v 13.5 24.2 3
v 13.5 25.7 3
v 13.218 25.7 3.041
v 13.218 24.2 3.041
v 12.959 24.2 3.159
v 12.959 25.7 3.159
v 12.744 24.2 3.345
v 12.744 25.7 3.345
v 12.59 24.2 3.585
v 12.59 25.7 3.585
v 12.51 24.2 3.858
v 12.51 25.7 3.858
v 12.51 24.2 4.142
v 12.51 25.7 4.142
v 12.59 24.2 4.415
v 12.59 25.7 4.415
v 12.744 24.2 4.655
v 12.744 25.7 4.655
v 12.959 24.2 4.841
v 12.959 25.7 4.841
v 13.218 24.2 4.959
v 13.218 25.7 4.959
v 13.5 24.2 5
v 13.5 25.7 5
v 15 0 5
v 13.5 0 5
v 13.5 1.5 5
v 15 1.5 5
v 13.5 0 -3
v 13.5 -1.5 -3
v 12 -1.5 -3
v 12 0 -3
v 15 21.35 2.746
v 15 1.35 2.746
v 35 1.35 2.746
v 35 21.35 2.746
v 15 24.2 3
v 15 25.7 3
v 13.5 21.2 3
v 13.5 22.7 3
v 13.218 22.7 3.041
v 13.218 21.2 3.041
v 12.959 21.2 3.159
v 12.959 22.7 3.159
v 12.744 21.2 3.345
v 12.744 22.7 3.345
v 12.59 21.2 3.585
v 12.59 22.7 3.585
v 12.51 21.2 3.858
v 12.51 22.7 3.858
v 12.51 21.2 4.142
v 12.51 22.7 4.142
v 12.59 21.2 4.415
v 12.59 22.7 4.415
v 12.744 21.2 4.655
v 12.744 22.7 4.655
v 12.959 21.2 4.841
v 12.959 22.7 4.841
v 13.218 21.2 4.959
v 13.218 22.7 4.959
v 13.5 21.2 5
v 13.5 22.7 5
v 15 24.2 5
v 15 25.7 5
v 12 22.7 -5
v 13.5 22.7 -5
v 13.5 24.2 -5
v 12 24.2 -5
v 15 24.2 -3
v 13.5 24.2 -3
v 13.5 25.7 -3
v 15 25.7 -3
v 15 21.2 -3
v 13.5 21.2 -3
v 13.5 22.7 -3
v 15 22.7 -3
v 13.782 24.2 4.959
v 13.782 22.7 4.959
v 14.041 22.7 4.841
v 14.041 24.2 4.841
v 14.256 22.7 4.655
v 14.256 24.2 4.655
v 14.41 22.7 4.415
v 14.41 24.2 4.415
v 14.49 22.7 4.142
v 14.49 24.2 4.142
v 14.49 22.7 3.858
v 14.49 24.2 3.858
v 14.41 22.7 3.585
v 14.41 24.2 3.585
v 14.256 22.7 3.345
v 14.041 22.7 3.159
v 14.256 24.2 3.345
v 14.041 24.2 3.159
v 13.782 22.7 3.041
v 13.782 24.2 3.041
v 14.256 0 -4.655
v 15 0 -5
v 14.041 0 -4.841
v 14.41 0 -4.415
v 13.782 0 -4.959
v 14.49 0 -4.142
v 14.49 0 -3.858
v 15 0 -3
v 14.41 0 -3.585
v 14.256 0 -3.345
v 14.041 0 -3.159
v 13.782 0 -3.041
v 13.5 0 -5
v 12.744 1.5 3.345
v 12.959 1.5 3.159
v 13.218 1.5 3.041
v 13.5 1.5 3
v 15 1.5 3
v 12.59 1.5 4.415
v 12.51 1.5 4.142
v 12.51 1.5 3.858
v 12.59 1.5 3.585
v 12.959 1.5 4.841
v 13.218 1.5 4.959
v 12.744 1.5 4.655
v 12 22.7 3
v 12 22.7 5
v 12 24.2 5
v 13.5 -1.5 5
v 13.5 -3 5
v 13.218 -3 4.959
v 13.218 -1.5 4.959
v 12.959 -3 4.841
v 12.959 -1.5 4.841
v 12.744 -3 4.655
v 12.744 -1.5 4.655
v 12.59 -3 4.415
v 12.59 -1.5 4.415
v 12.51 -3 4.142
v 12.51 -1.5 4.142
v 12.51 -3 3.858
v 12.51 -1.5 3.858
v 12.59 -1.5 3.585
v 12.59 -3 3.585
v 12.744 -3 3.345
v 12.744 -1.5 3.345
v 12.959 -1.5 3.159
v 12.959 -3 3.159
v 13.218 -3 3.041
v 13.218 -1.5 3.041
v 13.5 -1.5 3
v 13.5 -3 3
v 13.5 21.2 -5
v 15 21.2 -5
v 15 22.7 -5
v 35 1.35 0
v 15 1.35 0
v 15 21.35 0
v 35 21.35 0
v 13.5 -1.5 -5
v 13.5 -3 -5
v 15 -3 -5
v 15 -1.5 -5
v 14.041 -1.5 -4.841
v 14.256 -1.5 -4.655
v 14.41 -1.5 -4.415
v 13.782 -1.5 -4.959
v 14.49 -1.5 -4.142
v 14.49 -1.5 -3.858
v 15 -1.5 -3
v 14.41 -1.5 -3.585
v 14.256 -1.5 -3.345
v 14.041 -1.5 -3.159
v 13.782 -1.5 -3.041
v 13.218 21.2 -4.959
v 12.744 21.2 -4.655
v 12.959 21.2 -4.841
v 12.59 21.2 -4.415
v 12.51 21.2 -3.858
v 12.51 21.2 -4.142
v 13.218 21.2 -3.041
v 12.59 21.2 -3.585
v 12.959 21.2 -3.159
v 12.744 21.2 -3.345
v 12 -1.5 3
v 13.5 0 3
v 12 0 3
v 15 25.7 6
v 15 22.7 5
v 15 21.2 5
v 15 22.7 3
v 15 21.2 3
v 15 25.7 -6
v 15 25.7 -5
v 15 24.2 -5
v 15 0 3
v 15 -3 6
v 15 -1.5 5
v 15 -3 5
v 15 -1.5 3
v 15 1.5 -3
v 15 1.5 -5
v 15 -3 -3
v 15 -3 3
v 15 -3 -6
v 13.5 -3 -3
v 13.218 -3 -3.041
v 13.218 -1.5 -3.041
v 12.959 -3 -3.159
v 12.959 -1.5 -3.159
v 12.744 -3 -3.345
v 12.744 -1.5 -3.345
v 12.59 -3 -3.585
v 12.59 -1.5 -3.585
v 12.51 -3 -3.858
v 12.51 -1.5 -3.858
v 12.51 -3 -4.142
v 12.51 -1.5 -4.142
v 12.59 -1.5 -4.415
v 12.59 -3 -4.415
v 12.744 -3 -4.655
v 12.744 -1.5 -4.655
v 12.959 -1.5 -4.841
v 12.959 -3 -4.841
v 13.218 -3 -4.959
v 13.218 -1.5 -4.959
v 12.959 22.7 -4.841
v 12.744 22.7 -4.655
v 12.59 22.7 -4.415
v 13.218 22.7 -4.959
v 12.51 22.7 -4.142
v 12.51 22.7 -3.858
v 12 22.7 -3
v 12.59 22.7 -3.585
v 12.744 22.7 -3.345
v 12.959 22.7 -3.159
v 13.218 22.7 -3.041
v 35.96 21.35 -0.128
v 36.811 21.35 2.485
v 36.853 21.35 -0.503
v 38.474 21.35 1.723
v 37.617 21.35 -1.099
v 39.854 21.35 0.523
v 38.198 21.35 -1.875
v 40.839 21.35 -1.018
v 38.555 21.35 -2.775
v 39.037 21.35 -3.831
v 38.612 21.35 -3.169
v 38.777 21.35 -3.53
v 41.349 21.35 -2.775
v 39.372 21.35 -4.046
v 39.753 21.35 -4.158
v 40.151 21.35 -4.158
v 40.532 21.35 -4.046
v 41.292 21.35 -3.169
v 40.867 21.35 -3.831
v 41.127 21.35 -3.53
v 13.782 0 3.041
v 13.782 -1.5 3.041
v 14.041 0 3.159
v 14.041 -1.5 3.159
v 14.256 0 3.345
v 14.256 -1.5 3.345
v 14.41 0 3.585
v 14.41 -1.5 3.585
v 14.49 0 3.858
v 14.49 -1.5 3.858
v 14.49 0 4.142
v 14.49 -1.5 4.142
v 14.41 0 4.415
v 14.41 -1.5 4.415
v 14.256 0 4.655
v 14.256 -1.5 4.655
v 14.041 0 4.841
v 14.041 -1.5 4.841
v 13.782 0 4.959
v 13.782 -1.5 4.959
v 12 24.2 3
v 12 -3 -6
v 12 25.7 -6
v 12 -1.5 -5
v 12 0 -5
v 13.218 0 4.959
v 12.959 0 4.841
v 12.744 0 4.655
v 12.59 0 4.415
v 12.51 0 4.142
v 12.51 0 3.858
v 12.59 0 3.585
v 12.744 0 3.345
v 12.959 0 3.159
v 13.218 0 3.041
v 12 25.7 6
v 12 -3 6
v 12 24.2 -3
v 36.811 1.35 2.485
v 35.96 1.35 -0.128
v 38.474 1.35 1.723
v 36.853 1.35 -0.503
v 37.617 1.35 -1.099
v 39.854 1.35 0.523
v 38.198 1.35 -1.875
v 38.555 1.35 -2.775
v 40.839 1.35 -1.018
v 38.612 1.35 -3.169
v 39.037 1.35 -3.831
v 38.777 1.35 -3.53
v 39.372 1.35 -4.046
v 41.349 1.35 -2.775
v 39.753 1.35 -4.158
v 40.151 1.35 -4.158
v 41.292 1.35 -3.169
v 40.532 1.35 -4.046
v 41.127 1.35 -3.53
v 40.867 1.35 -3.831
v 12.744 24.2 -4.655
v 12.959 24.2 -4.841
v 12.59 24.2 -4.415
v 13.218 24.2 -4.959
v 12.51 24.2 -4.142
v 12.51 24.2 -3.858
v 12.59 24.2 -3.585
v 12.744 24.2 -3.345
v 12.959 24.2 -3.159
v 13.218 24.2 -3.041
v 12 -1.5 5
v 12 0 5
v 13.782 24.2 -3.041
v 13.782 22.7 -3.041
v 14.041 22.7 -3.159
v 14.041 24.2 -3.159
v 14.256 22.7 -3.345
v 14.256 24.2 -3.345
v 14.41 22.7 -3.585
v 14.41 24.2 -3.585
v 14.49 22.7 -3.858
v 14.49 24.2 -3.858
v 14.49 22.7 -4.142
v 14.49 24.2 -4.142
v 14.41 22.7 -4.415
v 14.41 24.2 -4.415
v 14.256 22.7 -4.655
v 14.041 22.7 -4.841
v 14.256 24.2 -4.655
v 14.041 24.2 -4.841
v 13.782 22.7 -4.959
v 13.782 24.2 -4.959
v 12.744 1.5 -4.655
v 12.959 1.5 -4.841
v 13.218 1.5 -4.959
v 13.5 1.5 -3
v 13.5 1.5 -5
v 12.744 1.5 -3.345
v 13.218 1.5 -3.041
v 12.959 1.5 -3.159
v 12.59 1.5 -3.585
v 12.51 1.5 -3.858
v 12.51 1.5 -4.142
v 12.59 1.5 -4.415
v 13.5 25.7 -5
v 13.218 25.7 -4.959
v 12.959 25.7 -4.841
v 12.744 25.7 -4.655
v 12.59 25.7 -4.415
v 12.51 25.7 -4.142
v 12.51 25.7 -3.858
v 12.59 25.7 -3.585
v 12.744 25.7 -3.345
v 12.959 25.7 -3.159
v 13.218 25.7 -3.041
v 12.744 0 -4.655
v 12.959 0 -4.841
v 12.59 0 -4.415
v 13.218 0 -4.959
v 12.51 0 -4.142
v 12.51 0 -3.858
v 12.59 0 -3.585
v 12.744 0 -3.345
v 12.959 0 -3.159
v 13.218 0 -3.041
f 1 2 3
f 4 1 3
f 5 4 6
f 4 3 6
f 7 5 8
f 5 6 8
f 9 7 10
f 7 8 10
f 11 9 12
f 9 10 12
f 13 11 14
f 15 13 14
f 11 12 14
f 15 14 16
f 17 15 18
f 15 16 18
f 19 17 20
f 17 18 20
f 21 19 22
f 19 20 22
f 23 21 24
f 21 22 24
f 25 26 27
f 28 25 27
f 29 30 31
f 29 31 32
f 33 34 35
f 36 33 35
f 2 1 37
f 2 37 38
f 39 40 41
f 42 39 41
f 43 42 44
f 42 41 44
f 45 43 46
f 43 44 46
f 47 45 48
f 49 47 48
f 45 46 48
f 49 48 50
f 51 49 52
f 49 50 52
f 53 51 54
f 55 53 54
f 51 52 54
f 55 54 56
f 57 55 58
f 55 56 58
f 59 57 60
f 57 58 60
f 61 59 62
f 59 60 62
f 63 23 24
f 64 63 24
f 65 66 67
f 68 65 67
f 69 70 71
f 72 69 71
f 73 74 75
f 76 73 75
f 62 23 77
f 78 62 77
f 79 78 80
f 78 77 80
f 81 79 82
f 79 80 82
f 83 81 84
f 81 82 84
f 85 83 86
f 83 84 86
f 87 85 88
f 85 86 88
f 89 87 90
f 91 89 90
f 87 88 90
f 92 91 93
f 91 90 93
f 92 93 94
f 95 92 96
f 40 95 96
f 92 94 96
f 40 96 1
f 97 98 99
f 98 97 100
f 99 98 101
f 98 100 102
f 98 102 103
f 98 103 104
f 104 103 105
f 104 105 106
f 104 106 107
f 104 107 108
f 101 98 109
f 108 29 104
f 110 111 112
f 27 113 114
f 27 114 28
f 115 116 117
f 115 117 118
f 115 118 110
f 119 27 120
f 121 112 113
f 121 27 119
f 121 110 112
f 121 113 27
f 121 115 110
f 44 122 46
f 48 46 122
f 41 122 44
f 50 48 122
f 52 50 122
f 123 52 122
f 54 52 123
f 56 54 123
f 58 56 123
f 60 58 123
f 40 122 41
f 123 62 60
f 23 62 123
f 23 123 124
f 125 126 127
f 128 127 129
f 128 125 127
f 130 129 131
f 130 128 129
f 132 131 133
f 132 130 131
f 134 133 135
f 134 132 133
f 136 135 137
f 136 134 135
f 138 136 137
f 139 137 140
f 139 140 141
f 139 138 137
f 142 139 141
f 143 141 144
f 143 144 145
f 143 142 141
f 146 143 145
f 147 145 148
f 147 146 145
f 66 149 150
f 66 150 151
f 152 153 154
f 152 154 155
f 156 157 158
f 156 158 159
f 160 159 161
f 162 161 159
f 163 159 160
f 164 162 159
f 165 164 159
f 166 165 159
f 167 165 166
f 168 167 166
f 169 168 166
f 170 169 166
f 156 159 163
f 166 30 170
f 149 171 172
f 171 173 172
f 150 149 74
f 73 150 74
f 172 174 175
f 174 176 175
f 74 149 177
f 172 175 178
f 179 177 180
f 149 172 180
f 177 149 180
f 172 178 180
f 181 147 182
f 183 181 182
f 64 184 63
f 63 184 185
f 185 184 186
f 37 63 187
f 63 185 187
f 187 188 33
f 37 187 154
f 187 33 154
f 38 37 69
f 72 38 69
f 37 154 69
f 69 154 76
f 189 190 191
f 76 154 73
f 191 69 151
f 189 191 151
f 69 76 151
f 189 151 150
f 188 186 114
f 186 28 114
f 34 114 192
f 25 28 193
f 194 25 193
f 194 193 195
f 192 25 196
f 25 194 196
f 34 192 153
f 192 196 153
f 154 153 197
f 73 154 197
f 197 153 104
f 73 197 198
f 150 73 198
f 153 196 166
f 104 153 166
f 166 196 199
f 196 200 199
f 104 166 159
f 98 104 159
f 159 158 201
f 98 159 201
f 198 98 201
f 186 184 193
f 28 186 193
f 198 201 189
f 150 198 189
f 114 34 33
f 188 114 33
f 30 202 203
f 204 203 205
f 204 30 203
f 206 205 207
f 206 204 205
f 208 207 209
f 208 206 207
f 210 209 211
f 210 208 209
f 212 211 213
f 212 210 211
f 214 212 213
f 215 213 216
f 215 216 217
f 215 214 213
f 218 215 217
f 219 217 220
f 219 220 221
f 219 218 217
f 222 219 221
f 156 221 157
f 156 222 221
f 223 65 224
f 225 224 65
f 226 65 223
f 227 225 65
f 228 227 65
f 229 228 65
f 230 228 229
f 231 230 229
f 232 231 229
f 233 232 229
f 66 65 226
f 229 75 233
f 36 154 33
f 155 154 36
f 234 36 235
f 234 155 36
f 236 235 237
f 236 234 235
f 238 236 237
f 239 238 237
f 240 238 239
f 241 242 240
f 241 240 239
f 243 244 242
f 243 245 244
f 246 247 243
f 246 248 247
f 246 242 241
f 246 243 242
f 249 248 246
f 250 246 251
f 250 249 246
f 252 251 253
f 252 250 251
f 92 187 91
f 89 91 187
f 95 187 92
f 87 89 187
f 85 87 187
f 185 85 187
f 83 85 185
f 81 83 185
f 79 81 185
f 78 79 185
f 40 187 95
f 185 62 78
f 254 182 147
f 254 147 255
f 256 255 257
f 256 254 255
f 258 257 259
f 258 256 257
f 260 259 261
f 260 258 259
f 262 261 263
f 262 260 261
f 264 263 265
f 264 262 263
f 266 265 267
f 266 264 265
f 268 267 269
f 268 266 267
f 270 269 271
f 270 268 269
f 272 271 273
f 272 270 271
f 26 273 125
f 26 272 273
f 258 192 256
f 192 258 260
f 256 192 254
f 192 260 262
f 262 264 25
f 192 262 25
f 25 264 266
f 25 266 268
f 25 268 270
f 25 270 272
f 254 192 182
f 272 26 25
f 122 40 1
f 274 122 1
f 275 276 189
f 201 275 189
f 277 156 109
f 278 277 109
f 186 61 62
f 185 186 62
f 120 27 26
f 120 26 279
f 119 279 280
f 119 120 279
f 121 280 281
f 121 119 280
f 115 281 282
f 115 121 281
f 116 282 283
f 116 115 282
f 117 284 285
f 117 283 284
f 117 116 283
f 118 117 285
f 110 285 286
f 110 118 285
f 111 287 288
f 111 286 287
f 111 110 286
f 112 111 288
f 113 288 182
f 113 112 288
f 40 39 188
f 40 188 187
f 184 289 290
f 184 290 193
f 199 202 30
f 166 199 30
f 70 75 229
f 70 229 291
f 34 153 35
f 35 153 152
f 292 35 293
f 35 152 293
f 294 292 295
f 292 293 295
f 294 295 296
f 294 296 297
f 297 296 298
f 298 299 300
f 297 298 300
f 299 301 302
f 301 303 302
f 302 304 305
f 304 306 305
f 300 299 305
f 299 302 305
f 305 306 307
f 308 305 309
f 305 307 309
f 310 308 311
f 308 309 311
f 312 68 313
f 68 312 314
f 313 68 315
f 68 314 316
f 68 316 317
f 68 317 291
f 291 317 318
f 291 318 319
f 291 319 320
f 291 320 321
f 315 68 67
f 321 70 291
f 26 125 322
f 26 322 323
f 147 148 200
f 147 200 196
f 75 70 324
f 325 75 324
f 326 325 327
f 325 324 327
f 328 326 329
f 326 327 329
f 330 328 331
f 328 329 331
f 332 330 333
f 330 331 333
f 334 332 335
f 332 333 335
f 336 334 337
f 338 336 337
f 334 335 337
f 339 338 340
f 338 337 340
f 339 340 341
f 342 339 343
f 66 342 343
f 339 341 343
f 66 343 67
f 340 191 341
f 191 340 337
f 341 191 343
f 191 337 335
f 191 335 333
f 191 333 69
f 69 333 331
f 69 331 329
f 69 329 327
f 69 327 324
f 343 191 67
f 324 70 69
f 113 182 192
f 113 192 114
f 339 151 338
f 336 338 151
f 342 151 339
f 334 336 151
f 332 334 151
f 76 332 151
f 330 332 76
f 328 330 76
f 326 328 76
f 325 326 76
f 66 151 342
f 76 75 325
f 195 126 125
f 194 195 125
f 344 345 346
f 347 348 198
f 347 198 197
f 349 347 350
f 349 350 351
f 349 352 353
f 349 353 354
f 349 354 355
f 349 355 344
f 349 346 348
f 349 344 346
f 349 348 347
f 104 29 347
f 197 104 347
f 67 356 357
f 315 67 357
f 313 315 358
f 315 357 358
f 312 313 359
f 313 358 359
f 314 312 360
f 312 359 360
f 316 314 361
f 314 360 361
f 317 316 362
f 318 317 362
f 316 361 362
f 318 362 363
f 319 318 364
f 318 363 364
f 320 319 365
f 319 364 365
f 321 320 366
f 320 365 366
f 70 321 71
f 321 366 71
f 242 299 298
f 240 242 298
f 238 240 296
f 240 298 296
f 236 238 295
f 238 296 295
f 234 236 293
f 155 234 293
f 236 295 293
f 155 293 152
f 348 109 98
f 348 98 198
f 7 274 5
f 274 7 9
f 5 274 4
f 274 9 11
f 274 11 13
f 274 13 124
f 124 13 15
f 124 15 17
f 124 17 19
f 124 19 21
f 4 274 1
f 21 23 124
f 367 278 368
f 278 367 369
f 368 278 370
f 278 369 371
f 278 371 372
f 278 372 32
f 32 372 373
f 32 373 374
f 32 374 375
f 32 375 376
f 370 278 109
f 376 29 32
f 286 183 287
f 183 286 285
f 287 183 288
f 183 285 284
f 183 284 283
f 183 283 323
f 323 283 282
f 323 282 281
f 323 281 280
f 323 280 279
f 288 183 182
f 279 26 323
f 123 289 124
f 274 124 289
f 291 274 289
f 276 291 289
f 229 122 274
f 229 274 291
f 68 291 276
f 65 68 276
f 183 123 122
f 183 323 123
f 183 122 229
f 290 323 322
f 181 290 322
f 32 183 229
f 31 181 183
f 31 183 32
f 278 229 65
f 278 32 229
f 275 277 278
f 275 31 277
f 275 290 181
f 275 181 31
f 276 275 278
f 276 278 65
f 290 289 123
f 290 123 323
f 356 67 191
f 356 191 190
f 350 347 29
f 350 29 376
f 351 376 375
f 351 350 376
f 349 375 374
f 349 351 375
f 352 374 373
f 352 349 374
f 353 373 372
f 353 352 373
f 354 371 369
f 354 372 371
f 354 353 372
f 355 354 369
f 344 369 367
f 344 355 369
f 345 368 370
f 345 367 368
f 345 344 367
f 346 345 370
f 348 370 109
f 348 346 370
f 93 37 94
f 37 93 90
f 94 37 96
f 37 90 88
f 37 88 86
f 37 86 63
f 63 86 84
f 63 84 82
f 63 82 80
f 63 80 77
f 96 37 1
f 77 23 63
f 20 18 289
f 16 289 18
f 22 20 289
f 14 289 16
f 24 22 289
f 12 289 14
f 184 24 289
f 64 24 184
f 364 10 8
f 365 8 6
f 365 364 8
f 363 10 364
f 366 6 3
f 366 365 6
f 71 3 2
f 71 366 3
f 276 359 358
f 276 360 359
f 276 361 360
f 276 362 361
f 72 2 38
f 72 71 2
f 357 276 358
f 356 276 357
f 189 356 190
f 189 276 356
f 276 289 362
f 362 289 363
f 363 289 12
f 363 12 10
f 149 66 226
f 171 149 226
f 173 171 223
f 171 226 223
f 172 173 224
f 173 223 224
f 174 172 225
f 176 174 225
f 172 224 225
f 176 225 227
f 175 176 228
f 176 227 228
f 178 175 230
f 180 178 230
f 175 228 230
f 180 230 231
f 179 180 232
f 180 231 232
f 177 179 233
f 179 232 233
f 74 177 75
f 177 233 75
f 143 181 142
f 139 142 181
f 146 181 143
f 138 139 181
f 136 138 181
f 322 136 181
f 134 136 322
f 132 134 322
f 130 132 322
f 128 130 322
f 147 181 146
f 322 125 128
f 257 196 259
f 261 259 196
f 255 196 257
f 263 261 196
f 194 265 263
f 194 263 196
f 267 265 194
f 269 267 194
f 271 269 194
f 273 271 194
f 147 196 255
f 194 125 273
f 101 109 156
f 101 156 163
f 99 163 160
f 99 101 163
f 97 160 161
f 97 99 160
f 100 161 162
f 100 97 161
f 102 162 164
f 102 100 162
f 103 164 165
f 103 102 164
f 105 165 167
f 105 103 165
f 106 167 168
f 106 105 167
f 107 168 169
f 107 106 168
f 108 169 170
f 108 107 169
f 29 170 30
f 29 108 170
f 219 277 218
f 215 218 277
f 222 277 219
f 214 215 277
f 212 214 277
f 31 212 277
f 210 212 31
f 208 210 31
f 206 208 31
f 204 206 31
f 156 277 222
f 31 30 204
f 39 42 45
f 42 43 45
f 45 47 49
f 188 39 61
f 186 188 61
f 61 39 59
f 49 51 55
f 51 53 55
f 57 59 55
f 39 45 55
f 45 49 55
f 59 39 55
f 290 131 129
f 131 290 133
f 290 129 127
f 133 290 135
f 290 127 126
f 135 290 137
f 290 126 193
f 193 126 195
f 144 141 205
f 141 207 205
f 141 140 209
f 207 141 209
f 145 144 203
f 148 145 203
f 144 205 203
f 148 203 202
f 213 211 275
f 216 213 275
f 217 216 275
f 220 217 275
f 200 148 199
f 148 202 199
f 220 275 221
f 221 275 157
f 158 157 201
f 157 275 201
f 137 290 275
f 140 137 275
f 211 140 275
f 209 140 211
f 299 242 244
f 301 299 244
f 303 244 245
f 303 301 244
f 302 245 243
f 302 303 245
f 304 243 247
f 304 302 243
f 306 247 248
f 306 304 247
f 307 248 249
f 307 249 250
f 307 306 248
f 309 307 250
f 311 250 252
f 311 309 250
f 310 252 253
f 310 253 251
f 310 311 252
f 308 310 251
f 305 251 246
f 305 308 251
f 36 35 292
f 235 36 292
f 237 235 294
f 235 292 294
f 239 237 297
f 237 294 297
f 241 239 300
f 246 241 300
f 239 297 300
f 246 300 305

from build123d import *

# Parameters (mm, degrees)
SKETCH1_W                = 3
SKETCH1_H                = 12
BOSS_EXTRUDE1_DEPTH      = 3
ESQUISSE1_W              = 3
ESQUISSE1_H              = 12
BOSS_EXTRU_1_DEPTH       = 25.7
ESQUISSE2_R              = 1
ENL_V_MAT_EXTRU_1_DEPTH  = 4.5
ENL_V_START              = -4.5
ESQUISSE10_R             = 1
ENL_V_MAT_EXTRU_3_DEPTH  = 4.5
ESQUISSE13_W             = 2
ESQUISSE13_H             = 1.5
ENL_V_MAT_EXTRU_5_DEPTH  = 5
ESQUISSE14_W             = 2
ESQUISSE14_H             = 1.5
ENL_V_MAT_EXTRU_6_DEPTH  = 5
BOSS_EXTRUDE2_DEPTH      = 10
BOSS_EXTRUDE2_DEPTH_BACK = 10
SKETCH2_W                = 20
SKETCH2_H                = 2.745941069


with BuildPart() as part:
    # Sketch1 → Boss-Extrude1 (new body)
    with BuildSketch(Plane(origin=(0, 0, 0), x_dir=(1, 0, 0), z_dir=(0, 1, 0))):
        with Locations((13.5, 0)):
            Rectangle(SKETCH1_W, SKETCH1_H)
    extrude(amount=-BOSS_EXTRUDE1_DEPTH)

    # Esquisse1 → Boss.-Extru.1 (add)
    with BuildSketch(Plane(origin=(0, 0, 0), x_dir=(1, 0, 0), z_dir=(0, 1, 0))):
        with Locations((13.5, 0)):
            Rectangle(ESQUISSE1_W, ESQUISSE1_H)
    extrude(amount=BOSS_EXTRU_1_DEPTH)

    # Esquisse2 → Enlèv. mat.-Extru.1 (cut)
    with BuildSketch(Plane(origin=(0, 25.7, 0), x_dir=(1, 0, 0), z_dir=(0, 1, 0))):
        with Locations(Location((13.5, 4, 0), (0, 0, 270))):
            Circle(ESQUISSE2_R)
        with Locations(Location((13.5, -4, 0), (0, 0, 270))):
            Circle(ESQUISSE2_R)
    extrude(amount=-ENL_V_MAT_EXTRU_1_DEPTH, mode=Mode.SUBTRACT)

    # Esquisse10 → Enlèv. mat.-Extru.3 (cut)
    with BuildSketch(Plane.XZ.offset(3).offset(ENL_V_START)):
        with Locations(Location((13.5, -4, 0), (0, 0, 90))):
            Circle(ESQUISSE10_R)
        with Locations(Location((13.5, 4, 0), (0, 0, 90))):
            Circle(ESQUISSE10_R)
    extrude(amount=ENL_V_MAT_EXTRU_3_DEPTH, mode=Mode.SUBTRACT)

    # Esquisse13 → Enlèv. mat.-Extru.5 (cut)
    with BuildSketch(Plane.ZY.offset(-13.5)):
        with Locations((4, -2.25)):
            Rectangle(ESQUISSE13_W, ESQUISSE13_H)
        with Locations((4, 0.75)):
            Rectangle(ESQUISSE13_W, ESQUISSE13_H)
        with Locations((-4, 0.75)):
            Rectangle(ESQUISSE13_W, ESQUISSE13_H)
        with Locations((-4, -2.25)):
            Rectangle(ESQUISSE13_W, ESQUISSE13_H)
        with Locations((-4, 24.95)):
            Rectangle(ESQUISSE13_W, ESQUISSE13_H)
        with Locations((-4, 21.95)):
            Rectangle(ESQUISSE13_W, ESQUISSE13_H)
        with Locations((4, 21.95)):
            Rectangle(ESQUISSE13_W, ESQUISSE13_H)
        with Locations((4, 24.95)):
            Rectangle(ESQUISSE13_W, ESQUISSE13_H)
    extrude(amount=-ENL_V_MAT_EXTRU_5_DEPTH, mode=Mode.SUBTRACT)

    # Esquisse14 → Enlèv. mat.-Extru.6 (cut)
    with BuildSketch(Plane.ZY.offset(-13.5)):
        with Locations((-4, -0.75)):
            Rectangle(ESQUISSE14_W, ESQUISSE14_H)
        with Locations((4, -0.75)):
            Rectangle(ESQUISSE14_W, ESQUISSE14_H)
        with Locations((4, 23.45)):
            Rectangle(ESQUISSE14_W, ESQUISSE14_H)
        with Locations((-4, 23.45)):
            Rectangle(ESQUISSE14_W, ESQUISSE14_H)
    extrude(amount=ENL_V_MAT_EXTRU_6_DEPTH, mode=Mode.SUBTRACT)

    # Sketch2 → Boss-Extrude2 (add, two sides: drawn at the far end of the back side and taken through both)
    with BuildSketch(Plane(origin=(0, 11.35, 0), x_dir=(1, 0, 0), z_dir=(0, 1, 0)).offset(-BOSS_EXTRUDE2_DEPTH_BACK)):
        with Locations((25, -1.372970535)):
            Rectangle(SKETCH2_W, SKETCH2_H)
        with BuildLine():
            ThreePointArc((35, -2.745941069), (39.206766833, -1.17258084), (41.348589647, 2.775196335))
            Line((41.348589647, 2.775196335), (38.555074141, 2.775196335))
            ThreePointArc((38.555074141, 2.775196335), (37.255009249, 0.775948112), (35, 0))
            Line((35, 0), (35, -2.745941069))
        make_face()
        with BuildLine():
            Line((41.348589647, 2.775196335), (38.555074141, 2.775196335))
            ThreePointArc((38.555074141, 2.775196335), (39.951831894, 4.171954088), (41.348589647, 2.775196335))
        make_face()
    extrude(amount=BOSS_EXTRUDE2_DEPTH + BOSS_EXTRUDE2_DEPTH_BACK)


solid = part.part
